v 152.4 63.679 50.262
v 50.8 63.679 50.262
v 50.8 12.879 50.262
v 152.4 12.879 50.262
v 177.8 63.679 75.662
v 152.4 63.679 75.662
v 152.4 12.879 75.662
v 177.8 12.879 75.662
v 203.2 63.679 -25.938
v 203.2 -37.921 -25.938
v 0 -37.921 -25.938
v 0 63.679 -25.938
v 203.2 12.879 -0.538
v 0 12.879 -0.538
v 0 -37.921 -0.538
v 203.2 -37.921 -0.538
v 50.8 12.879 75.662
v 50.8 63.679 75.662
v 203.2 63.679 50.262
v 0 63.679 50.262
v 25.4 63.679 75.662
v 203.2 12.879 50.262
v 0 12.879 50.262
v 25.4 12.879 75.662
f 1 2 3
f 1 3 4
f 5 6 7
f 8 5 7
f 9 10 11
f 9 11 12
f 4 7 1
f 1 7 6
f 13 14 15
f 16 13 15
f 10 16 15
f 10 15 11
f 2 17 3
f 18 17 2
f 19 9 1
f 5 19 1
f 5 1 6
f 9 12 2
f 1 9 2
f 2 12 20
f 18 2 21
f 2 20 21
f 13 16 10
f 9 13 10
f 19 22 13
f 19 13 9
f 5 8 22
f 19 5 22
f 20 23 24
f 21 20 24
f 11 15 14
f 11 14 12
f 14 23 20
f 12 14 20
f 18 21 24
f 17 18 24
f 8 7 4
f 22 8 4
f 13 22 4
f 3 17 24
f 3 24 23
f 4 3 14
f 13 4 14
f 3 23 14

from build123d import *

# Parameters (mm, degrees)
F1_DEPTH = 203.2
F2_W     = 25.4
F2_H     = 101.6
F3_DEPTH = 25.4
F4_W     = 50.8
F4_H     = 101.6
F5_DEPTH = 25.4
F7_DEPTH = 50.8
F8_W     = 101.6
F8_H     = 50.8
F9_DEPTH = 25.4


with BuildPart() as f1:
    # F0 (on Right) → F1 (new body)
    with BuildSketch(Plane.YZ):
        Polygon((12.87863, -0.538062), (-37.92137, -0.538062), (-37.92137, -25.938062), (63.67863, -25.938062), (63.67863, -0.538062), (63.67863, 75.661938), (12.87863, 75.661938), align=None)
    extrude(amount=F1_DEPTH)

    # F2 (on face) → F3 (cut)
    with BuildSketch(Plane.XY.offset(-0.538062)):
        with Locations((-25.22137, -101.6)):
            Rectangle(F2_W, F2_H)
    extrude(amount=-F3_DEPTH, mode=Mode.SUBTRACT)

    # F4 (on face) → F5 (cut)
    with BuildSketch(Plane.XY.offset(75.661938)):
        with Locations((38.27863, -101.6)):
            Rectangle(F4_W, F4_H)
    extrude(amount=-F5_DEPTH, mode=Mode.SUBTRACT)

    # F6 (on face) → F7 (cut)
    with BuildSketch(Plane.XZ.offset(-12.87863)):
        Polygon((203.2, 75.661938), (177.8, 75.661938), (203.2, 50.261938), align=None)
        Polygon((0, 50.261938), (25.4, 75.661938), (0, 75.661938), align=None)
    extrude(amount=-F7_DEPTH, mode=Mode.SUBTRACT)

    # F8 (on face) → F9 (cut)
    with BuildSketch(Plane.XY.offset(75.661938)):
        with Locations((101.6, 38.27863)):
            Rectangle(F8_W, F8_H)
    extrude(amount=-F9_DEPTH, mode=Mode.SUBTRACT)


solid = f1.part
